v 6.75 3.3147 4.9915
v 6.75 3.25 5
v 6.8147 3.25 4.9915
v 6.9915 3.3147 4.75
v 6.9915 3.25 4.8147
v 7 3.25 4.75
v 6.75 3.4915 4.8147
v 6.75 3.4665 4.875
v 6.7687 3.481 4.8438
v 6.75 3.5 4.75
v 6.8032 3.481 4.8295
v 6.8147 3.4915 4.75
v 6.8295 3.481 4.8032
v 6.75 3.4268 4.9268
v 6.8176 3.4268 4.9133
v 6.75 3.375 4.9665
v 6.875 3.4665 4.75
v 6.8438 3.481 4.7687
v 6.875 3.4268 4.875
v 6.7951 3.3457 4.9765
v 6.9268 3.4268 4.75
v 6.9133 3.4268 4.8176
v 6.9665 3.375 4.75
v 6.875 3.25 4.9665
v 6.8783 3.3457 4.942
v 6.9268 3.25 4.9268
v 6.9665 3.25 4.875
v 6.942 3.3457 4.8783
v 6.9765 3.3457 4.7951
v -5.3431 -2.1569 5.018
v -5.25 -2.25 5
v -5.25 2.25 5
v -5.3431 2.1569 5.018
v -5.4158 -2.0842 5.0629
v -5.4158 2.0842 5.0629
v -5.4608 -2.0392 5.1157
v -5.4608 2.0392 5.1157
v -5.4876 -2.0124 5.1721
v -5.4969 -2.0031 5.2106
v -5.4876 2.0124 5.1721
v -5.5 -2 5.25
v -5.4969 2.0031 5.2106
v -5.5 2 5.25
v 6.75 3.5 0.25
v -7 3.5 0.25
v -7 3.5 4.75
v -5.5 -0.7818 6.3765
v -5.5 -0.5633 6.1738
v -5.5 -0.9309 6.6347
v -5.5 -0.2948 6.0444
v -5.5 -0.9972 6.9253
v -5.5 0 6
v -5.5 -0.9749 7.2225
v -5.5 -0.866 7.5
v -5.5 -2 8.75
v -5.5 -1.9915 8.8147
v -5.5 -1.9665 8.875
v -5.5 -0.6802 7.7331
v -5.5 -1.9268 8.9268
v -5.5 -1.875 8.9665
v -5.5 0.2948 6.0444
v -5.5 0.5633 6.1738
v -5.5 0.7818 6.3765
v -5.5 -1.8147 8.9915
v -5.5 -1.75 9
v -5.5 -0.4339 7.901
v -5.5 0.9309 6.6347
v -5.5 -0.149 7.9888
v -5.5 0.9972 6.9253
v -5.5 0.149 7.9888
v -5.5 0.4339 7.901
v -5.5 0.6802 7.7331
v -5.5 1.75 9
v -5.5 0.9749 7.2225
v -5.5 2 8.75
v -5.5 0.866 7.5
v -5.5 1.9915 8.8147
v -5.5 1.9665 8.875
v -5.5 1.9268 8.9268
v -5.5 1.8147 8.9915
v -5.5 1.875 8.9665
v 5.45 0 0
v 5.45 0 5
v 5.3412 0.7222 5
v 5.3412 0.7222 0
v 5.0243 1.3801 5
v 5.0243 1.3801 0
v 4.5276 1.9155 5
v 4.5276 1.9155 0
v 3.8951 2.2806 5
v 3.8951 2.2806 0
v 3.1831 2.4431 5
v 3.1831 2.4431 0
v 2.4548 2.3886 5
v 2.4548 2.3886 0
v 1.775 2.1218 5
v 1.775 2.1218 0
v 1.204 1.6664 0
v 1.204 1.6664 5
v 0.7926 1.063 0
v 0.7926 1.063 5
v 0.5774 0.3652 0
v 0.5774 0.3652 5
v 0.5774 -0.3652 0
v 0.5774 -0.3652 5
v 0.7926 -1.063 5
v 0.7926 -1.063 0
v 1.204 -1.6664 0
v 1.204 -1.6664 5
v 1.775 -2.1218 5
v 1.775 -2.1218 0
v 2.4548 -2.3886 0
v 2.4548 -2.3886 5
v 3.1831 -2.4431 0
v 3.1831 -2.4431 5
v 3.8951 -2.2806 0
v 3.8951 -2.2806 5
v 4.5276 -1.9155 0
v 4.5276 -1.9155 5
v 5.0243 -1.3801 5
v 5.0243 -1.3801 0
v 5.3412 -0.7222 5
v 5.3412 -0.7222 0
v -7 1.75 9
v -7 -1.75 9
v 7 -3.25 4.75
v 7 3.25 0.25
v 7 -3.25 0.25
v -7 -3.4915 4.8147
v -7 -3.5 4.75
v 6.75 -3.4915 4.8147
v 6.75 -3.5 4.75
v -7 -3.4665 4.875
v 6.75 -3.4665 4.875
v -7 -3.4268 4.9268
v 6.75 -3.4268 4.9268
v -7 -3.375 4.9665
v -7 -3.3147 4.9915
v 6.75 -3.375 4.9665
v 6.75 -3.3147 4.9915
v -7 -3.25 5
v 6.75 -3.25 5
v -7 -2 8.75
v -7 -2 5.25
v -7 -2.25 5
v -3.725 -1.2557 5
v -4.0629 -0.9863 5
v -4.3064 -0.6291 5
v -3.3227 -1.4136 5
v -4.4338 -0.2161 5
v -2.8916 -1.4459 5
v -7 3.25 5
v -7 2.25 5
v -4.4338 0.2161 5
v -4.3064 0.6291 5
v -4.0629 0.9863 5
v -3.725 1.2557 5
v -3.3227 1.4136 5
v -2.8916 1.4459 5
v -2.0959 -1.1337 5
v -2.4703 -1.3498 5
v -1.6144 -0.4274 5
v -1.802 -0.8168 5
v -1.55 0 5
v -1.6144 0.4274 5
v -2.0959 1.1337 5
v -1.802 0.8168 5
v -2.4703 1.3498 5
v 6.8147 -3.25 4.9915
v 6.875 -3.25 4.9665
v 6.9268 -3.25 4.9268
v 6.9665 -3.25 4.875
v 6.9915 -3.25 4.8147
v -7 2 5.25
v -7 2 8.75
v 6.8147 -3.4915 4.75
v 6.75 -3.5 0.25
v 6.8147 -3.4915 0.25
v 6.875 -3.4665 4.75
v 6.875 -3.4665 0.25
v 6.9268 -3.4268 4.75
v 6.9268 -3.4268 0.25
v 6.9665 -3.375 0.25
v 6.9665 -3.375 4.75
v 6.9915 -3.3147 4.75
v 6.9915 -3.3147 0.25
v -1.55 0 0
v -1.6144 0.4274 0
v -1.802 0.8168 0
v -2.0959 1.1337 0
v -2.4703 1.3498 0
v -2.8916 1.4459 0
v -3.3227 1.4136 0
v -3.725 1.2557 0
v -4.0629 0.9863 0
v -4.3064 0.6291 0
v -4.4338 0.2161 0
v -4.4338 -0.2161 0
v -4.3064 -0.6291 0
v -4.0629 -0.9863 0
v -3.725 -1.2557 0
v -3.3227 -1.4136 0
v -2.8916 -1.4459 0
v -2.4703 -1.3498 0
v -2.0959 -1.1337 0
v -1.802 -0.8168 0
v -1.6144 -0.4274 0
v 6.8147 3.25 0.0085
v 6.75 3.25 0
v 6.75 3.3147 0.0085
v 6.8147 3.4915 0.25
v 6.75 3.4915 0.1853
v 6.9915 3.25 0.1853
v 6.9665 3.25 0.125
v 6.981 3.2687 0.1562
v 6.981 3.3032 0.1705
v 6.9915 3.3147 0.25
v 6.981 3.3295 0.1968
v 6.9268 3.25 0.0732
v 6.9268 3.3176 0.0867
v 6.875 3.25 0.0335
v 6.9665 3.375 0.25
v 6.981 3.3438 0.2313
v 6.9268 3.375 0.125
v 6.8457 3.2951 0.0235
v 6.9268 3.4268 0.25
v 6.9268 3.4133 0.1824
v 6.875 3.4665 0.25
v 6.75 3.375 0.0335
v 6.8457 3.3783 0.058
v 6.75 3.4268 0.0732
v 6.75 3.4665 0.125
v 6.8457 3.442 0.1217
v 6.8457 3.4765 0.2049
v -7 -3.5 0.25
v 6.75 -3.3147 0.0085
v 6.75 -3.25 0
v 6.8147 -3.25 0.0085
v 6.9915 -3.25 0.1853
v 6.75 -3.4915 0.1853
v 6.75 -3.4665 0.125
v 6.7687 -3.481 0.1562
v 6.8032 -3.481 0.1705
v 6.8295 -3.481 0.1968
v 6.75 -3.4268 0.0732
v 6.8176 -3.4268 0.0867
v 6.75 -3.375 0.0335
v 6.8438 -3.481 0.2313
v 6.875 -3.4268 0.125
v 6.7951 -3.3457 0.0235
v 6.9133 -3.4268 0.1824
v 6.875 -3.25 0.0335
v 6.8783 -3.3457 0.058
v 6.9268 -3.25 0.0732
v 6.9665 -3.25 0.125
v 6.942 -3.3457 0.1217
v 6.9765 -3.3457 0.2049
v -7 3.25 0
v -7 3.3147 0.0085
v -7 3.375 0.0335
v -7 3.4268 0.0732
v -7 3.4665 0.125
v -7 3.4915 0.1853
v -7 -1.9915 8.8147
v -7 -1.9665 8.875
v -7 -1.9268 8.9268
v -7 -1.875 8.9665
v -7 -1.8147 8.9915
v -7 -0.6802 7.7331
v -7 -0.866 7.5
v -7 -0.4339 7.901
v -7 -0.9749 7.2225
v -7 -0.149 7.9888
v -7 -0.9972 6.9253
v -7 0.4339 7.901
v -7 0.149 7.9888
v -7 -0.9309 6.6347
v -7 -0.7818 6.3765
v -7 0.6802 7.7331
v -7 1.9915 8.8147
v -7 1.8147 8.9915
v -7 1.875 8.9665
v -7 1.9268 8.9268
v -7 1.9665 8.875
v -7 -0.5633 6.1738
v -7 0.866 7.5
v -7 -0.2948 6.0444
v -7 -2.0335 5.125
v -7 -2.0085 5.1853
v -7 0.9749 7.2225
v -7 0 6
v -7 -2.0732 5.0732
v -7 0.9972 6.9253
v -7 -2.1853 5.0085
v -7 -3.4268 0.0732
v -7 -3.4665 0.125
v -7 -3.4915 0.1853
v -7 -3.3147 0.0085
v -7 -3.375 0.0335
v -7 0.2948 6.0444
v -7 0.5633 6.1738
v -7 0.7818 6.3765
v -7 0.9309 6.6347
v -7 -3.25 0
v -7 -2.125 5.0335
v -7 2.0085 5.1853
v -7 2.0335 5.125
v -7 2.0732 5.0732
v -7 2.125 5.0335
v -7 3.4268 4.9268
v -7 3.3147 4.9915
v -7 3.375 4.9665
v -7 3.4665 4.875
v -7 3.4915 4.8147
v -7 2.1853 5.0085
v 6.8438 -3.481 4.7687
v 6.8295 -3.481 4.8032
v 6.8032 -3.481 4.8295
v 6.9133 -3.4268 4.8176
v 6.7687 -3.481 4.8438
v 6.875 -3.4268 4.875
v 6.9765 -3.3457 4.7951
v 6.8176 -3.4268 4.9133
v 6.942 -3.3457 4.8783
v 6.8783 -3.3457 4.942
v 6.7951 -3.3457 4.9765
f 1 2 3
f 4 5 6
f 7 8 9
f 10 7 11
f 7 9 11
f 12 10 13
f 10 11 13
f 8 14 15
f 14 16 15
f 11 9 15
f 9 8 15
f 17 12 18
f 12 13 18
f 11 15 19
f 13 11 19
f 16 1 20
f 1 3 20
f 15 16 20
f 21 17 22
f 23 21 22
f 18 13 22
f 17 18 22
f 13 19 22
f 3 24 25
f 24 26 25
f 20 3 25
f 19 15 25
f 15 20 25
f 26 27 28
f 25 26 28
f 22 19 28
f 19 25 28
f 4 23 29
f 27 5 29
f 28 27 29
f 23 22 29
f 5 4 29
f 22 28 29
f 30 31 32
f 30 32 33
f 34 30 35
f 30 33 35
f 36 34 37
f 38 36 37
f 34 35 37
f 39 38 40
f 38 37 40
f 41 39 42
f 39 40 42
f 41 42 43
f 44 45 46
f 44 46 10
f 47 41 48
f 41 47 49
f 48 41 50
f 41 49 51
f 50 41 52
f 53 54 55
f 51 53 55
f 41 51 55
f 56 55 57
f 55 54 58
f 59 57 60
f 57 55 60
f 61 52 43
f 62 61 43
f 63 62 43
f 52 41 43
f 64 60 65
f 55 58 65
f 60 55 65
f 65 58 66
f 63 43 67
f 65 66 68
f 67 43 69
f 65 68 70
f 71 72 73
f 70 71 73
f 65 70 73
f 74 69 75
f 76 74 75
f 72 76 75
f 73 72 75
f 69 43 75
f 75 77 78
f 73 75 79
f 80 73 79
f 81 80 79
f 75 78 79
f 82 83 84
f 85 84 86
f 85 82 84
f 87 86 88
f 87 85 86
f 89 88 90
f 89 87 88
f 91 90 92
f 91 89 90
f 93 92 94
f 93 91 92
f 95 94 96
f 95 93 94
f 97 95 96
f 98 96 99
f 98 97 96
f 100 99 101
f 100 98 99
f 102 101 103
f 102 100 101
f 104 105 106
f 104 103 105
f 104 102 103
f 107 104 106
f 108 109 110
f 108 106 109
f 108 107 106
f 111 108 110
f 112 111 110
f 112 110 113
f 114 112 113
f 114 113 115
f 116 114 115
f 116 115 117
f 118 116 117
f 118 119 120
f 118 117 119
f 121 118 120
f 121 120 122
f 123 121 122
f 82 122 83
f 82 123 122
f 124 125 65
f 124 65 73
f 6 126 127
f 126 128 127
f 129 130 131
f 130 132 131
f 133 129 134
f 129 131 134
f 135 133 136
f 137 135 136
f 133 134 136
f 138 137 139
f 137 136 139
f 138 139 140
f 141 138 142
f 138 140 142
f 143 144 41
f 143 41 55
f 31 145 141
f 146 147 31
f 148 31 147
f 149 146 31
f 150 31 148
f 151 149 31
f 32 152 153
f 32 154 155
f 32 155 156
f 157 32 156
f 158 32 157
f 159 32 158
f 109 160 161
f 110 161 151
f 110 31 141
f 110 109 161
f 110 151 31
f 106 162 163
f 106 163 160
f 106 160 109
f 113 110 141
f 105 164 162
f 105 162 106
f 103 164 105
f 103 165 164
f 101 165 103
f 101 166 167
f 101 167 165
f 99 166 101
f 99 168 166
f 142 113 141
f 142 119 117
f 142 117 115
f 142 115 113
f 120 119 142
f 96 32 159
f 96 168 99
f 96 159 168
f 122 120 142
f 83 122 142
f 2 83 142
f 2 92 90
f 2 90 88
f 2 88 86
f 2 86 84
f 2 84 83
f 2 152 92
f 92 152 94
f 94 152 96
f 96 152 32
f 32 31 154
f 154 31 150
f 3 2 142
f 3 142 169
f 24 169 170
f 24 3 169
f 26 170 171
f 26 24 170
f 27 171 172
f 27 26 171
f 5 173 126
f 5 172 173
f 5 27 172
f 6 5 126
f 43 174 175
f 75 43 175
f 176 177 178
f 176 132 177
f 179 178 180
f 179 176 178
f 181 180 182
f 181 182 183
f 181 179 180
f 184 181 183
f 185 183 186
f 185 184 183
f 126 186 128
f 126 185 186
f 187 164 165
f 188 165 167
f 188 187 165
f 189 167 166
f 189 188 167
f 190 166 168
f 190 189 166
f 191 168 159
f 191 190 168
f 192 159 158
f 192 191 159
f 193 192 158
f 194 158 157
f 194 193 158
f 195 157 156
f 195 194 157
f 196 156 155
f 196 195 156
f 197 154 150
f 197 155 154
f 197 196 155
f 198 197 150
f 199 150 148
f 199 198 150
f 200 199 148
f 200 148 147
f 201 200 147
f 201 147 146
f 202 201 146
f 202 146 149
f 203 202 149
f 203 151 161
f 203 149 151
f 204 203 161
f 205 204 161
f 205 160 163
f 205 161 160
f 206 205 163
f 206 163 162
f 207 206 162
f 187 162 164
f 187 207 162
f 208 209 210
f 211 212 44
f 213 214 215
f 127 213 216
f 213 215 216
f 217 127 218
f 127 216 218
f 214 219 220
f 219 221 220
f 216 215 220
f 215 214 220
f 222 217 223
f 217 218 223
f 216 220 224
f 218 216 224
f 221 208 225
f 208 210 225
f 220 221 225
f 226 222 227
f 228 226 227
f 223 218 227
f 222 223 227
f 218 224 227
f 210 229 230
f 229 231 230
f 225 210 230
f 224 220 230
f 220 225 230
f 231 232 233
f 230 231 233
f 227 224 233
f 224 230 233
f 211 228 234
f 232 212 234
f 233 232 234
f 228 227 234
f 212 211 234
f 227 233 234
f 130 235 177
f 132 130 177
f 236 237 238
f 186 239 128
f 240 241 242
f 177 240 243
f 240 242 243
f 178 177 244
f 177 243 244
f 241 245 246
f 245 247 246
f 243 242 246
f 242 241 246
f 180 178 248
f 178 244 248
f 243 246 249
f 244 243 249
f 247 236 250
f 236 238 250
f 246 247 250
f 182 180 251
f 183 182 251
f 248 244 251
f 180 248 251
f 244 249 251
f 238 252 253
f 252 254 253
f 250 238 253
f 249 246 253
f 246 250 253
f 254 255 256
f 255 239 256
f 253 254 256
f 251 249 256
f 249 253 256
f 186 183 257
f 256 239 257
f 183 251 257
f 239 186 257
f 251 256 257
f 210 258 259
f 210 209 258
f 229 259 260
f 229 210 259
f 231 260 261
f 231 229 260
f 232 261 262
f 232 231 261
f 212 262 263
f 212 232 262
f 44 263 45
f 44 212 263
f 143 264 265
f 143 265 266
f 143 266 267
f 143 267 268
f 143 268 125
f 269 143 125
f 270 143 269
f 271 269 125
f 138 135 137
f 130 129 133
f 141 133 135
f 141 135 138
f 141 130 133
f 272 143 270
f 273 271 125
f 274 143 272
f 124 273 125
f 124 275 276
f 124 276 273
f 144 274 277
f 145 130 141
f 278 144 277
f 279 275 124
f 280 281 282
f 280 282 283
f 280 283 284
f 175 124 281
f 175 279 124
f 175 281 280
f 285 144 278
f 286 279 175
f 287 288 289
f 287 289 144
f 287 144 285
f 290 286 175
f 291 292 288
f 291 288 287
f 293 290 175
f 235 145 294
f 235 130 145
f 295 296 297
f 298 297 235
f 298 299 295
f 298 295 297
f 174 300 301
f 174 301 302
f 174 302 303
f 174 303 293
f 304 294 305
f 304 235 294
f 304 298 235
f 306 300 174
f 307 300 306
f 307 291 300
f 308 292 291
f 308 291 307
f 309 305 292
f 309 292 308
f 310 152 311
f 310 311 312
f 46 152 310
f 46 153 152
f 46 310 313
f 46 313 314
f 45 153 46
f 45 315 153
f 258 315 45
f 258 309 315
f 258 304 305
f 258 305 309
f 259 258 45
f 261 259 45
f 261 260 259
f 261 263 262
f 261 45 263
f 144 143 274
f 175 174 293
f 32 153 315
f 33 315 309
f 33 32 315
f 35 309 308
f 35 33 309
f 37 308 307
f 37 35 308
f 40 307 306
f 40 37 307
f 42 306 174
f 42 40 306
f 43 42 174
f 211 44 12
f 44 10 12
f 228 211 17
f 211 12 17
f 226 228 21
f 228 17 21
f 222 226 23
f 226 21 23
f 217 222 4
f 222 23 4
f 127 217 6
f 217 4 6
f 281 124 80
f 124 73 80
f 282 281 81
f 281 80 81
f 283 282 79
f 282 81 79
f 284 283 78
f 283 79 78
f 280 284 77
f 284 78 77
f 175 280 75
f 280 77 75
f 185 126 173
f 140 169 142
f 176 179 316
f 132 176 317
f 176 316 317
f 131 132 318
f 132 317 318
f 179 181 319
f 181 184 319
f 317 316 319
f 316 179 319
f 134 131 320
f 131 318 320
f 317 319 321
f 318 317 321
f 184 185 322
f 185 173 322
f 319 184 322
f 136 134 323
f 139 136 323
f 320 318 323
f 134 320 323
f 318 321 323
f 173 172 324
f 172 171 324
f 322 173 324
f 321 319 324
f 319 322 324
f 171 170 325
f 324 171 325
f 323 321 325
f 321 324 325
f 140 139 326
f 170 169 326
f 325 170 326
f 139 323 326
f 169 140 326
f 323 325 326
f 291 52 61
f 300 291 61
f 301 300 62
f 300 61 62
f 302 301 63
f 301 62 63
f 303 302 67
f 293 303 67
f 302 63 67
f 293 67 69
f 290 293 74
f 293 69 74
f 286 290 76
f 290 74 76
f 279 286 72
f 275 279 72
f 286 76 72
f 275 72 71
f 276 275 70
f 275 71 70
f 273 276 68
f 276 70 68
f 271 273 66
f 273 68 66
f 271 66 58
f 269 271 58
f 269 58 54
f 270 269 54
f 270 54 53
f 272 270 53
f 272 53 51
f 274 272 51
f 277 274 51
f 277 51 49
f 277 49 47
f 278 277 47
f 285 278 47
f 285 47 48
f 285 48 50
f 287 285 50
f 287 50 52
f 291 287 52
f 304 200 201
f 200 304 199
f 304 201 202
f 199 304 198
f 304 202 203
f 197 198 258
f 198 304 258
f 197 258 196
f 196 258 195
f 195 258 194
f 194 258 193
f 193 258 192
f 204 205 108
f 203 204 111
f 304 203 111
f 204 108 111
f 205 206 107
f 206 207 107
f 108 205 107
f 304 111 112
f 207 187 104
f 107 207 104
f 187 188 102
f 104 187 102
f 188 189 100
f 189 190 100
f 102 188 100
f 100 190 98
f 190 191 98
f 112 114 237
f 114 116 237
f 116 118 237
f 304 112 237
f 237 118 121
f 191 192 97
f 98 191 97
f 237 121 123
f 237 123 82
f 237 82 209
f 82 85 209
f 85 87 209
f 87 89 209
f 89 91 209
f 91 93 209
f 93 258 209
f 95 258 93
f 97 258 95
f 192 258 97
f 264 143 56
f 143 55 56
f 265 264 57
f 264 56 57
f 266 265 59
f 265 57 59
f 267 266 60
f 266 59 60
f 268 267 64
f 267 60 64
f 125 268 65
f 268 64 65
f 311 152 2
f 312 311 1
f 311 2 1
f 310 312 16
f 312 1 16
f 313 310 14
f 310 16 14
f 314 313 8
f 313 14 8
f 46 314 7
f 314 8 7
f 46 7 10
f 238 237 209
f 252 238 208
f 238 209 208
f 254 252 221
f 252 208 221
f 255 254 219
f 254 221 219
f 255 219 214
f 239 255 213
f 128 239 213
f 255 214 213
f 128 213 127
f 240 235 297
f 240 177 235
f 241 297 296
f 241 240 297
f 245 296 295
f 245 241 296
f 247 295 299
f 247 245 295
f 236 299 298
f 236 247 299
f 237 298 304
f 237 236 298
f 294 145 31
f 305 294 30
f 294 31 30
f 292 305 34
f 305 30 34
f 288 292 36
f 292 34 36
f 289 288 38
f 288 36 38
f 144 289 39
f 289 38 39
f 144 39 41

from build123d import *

# Parameters (mm, degrees)
SKETCH1_W           = 14
SKETCH1_H           = 7
BOSS_EXTRUDE1_DEPTH = 5
SKETCH2_R           = 2.45
SKETCH2_R_2         = 1.45
CUT_EXTRUDE1_DEPTH  = 10.287087811
SKETCH5_W           = 4
SKETCH5_H           = 4
BOSS_EXTRUDE3_DEPTH = 1.5
SKETCH9_R           = 1
CUT_EXTRUDE2_DEPTH  = 2
FILLET1_R           = 0.25


with BuildPart() as part:
    # Sketch1 → Boss-Extrude1 (new body)
    with BuildSketch(Plane.XY):
        Rectangle(SKETCH1_W, SKETCH1_H)
    extrude(amount=BOSS_EXTRUDE1_DEPTH)

    # Sketch2 → Cut-Extrude1 (cut, through all)
    with BuildSketch(Plane.XY):
        with Locations((3, 0)):
            Circle(SKETCH2_R)
        with Locations((-3, 0)):
            Circle(SKETCH2_R_2)
    extrude(amount=CUT_EXTRUDE1_DEPTH, mode=Mode.SUBTRACT)

    # Sketch5 → Boss-Extrude3 (add)
    with BuildSketch(Plane.ZY.offset(7)):
        with Locations((7, 0)):
            Rectangle(SKETCH5_W, SKETCH5_H)
    extrude(amount=-BOSS_EXTRUDE3_DEPTH)

    # Sketch9 → Cut-Extrude2 (cut)
    with BuildSketch(Plane(origin=(-5.5, 0, 0), x_dir=(0, 0, -1), z_dir=(1, 0, 0))):
        with Locations((-7, 0)):
            Circle(SKETCH9_R)
    extrude(amount=-CUT_EXTRUDE2_DEPTH, mode=Mode.SUBTRACT)

    # Fillet1
    fillet1_edges = [part.edges().sort_by_distance(p)[0] for p in [
        (7, 0, 5),
        (0, 3.5, 5),
        (-5.5, 0, 5),
        (-6.25, -2, 5),
        (-6.25, 2, 5),
        (-6.25, 2, 9),
        (-6.25, -2, 9),
        (0, 3.5, 0),
        (7, 0, 0),
        (0, -3.5, 0),
        (7, 3.5, 2.5),
        (7, -3.5, 2.5),
        (0, -3.5, 5),
    ]]
    fillet(fillet1_edges, radius=FILLET1_R)


solid = part.part
